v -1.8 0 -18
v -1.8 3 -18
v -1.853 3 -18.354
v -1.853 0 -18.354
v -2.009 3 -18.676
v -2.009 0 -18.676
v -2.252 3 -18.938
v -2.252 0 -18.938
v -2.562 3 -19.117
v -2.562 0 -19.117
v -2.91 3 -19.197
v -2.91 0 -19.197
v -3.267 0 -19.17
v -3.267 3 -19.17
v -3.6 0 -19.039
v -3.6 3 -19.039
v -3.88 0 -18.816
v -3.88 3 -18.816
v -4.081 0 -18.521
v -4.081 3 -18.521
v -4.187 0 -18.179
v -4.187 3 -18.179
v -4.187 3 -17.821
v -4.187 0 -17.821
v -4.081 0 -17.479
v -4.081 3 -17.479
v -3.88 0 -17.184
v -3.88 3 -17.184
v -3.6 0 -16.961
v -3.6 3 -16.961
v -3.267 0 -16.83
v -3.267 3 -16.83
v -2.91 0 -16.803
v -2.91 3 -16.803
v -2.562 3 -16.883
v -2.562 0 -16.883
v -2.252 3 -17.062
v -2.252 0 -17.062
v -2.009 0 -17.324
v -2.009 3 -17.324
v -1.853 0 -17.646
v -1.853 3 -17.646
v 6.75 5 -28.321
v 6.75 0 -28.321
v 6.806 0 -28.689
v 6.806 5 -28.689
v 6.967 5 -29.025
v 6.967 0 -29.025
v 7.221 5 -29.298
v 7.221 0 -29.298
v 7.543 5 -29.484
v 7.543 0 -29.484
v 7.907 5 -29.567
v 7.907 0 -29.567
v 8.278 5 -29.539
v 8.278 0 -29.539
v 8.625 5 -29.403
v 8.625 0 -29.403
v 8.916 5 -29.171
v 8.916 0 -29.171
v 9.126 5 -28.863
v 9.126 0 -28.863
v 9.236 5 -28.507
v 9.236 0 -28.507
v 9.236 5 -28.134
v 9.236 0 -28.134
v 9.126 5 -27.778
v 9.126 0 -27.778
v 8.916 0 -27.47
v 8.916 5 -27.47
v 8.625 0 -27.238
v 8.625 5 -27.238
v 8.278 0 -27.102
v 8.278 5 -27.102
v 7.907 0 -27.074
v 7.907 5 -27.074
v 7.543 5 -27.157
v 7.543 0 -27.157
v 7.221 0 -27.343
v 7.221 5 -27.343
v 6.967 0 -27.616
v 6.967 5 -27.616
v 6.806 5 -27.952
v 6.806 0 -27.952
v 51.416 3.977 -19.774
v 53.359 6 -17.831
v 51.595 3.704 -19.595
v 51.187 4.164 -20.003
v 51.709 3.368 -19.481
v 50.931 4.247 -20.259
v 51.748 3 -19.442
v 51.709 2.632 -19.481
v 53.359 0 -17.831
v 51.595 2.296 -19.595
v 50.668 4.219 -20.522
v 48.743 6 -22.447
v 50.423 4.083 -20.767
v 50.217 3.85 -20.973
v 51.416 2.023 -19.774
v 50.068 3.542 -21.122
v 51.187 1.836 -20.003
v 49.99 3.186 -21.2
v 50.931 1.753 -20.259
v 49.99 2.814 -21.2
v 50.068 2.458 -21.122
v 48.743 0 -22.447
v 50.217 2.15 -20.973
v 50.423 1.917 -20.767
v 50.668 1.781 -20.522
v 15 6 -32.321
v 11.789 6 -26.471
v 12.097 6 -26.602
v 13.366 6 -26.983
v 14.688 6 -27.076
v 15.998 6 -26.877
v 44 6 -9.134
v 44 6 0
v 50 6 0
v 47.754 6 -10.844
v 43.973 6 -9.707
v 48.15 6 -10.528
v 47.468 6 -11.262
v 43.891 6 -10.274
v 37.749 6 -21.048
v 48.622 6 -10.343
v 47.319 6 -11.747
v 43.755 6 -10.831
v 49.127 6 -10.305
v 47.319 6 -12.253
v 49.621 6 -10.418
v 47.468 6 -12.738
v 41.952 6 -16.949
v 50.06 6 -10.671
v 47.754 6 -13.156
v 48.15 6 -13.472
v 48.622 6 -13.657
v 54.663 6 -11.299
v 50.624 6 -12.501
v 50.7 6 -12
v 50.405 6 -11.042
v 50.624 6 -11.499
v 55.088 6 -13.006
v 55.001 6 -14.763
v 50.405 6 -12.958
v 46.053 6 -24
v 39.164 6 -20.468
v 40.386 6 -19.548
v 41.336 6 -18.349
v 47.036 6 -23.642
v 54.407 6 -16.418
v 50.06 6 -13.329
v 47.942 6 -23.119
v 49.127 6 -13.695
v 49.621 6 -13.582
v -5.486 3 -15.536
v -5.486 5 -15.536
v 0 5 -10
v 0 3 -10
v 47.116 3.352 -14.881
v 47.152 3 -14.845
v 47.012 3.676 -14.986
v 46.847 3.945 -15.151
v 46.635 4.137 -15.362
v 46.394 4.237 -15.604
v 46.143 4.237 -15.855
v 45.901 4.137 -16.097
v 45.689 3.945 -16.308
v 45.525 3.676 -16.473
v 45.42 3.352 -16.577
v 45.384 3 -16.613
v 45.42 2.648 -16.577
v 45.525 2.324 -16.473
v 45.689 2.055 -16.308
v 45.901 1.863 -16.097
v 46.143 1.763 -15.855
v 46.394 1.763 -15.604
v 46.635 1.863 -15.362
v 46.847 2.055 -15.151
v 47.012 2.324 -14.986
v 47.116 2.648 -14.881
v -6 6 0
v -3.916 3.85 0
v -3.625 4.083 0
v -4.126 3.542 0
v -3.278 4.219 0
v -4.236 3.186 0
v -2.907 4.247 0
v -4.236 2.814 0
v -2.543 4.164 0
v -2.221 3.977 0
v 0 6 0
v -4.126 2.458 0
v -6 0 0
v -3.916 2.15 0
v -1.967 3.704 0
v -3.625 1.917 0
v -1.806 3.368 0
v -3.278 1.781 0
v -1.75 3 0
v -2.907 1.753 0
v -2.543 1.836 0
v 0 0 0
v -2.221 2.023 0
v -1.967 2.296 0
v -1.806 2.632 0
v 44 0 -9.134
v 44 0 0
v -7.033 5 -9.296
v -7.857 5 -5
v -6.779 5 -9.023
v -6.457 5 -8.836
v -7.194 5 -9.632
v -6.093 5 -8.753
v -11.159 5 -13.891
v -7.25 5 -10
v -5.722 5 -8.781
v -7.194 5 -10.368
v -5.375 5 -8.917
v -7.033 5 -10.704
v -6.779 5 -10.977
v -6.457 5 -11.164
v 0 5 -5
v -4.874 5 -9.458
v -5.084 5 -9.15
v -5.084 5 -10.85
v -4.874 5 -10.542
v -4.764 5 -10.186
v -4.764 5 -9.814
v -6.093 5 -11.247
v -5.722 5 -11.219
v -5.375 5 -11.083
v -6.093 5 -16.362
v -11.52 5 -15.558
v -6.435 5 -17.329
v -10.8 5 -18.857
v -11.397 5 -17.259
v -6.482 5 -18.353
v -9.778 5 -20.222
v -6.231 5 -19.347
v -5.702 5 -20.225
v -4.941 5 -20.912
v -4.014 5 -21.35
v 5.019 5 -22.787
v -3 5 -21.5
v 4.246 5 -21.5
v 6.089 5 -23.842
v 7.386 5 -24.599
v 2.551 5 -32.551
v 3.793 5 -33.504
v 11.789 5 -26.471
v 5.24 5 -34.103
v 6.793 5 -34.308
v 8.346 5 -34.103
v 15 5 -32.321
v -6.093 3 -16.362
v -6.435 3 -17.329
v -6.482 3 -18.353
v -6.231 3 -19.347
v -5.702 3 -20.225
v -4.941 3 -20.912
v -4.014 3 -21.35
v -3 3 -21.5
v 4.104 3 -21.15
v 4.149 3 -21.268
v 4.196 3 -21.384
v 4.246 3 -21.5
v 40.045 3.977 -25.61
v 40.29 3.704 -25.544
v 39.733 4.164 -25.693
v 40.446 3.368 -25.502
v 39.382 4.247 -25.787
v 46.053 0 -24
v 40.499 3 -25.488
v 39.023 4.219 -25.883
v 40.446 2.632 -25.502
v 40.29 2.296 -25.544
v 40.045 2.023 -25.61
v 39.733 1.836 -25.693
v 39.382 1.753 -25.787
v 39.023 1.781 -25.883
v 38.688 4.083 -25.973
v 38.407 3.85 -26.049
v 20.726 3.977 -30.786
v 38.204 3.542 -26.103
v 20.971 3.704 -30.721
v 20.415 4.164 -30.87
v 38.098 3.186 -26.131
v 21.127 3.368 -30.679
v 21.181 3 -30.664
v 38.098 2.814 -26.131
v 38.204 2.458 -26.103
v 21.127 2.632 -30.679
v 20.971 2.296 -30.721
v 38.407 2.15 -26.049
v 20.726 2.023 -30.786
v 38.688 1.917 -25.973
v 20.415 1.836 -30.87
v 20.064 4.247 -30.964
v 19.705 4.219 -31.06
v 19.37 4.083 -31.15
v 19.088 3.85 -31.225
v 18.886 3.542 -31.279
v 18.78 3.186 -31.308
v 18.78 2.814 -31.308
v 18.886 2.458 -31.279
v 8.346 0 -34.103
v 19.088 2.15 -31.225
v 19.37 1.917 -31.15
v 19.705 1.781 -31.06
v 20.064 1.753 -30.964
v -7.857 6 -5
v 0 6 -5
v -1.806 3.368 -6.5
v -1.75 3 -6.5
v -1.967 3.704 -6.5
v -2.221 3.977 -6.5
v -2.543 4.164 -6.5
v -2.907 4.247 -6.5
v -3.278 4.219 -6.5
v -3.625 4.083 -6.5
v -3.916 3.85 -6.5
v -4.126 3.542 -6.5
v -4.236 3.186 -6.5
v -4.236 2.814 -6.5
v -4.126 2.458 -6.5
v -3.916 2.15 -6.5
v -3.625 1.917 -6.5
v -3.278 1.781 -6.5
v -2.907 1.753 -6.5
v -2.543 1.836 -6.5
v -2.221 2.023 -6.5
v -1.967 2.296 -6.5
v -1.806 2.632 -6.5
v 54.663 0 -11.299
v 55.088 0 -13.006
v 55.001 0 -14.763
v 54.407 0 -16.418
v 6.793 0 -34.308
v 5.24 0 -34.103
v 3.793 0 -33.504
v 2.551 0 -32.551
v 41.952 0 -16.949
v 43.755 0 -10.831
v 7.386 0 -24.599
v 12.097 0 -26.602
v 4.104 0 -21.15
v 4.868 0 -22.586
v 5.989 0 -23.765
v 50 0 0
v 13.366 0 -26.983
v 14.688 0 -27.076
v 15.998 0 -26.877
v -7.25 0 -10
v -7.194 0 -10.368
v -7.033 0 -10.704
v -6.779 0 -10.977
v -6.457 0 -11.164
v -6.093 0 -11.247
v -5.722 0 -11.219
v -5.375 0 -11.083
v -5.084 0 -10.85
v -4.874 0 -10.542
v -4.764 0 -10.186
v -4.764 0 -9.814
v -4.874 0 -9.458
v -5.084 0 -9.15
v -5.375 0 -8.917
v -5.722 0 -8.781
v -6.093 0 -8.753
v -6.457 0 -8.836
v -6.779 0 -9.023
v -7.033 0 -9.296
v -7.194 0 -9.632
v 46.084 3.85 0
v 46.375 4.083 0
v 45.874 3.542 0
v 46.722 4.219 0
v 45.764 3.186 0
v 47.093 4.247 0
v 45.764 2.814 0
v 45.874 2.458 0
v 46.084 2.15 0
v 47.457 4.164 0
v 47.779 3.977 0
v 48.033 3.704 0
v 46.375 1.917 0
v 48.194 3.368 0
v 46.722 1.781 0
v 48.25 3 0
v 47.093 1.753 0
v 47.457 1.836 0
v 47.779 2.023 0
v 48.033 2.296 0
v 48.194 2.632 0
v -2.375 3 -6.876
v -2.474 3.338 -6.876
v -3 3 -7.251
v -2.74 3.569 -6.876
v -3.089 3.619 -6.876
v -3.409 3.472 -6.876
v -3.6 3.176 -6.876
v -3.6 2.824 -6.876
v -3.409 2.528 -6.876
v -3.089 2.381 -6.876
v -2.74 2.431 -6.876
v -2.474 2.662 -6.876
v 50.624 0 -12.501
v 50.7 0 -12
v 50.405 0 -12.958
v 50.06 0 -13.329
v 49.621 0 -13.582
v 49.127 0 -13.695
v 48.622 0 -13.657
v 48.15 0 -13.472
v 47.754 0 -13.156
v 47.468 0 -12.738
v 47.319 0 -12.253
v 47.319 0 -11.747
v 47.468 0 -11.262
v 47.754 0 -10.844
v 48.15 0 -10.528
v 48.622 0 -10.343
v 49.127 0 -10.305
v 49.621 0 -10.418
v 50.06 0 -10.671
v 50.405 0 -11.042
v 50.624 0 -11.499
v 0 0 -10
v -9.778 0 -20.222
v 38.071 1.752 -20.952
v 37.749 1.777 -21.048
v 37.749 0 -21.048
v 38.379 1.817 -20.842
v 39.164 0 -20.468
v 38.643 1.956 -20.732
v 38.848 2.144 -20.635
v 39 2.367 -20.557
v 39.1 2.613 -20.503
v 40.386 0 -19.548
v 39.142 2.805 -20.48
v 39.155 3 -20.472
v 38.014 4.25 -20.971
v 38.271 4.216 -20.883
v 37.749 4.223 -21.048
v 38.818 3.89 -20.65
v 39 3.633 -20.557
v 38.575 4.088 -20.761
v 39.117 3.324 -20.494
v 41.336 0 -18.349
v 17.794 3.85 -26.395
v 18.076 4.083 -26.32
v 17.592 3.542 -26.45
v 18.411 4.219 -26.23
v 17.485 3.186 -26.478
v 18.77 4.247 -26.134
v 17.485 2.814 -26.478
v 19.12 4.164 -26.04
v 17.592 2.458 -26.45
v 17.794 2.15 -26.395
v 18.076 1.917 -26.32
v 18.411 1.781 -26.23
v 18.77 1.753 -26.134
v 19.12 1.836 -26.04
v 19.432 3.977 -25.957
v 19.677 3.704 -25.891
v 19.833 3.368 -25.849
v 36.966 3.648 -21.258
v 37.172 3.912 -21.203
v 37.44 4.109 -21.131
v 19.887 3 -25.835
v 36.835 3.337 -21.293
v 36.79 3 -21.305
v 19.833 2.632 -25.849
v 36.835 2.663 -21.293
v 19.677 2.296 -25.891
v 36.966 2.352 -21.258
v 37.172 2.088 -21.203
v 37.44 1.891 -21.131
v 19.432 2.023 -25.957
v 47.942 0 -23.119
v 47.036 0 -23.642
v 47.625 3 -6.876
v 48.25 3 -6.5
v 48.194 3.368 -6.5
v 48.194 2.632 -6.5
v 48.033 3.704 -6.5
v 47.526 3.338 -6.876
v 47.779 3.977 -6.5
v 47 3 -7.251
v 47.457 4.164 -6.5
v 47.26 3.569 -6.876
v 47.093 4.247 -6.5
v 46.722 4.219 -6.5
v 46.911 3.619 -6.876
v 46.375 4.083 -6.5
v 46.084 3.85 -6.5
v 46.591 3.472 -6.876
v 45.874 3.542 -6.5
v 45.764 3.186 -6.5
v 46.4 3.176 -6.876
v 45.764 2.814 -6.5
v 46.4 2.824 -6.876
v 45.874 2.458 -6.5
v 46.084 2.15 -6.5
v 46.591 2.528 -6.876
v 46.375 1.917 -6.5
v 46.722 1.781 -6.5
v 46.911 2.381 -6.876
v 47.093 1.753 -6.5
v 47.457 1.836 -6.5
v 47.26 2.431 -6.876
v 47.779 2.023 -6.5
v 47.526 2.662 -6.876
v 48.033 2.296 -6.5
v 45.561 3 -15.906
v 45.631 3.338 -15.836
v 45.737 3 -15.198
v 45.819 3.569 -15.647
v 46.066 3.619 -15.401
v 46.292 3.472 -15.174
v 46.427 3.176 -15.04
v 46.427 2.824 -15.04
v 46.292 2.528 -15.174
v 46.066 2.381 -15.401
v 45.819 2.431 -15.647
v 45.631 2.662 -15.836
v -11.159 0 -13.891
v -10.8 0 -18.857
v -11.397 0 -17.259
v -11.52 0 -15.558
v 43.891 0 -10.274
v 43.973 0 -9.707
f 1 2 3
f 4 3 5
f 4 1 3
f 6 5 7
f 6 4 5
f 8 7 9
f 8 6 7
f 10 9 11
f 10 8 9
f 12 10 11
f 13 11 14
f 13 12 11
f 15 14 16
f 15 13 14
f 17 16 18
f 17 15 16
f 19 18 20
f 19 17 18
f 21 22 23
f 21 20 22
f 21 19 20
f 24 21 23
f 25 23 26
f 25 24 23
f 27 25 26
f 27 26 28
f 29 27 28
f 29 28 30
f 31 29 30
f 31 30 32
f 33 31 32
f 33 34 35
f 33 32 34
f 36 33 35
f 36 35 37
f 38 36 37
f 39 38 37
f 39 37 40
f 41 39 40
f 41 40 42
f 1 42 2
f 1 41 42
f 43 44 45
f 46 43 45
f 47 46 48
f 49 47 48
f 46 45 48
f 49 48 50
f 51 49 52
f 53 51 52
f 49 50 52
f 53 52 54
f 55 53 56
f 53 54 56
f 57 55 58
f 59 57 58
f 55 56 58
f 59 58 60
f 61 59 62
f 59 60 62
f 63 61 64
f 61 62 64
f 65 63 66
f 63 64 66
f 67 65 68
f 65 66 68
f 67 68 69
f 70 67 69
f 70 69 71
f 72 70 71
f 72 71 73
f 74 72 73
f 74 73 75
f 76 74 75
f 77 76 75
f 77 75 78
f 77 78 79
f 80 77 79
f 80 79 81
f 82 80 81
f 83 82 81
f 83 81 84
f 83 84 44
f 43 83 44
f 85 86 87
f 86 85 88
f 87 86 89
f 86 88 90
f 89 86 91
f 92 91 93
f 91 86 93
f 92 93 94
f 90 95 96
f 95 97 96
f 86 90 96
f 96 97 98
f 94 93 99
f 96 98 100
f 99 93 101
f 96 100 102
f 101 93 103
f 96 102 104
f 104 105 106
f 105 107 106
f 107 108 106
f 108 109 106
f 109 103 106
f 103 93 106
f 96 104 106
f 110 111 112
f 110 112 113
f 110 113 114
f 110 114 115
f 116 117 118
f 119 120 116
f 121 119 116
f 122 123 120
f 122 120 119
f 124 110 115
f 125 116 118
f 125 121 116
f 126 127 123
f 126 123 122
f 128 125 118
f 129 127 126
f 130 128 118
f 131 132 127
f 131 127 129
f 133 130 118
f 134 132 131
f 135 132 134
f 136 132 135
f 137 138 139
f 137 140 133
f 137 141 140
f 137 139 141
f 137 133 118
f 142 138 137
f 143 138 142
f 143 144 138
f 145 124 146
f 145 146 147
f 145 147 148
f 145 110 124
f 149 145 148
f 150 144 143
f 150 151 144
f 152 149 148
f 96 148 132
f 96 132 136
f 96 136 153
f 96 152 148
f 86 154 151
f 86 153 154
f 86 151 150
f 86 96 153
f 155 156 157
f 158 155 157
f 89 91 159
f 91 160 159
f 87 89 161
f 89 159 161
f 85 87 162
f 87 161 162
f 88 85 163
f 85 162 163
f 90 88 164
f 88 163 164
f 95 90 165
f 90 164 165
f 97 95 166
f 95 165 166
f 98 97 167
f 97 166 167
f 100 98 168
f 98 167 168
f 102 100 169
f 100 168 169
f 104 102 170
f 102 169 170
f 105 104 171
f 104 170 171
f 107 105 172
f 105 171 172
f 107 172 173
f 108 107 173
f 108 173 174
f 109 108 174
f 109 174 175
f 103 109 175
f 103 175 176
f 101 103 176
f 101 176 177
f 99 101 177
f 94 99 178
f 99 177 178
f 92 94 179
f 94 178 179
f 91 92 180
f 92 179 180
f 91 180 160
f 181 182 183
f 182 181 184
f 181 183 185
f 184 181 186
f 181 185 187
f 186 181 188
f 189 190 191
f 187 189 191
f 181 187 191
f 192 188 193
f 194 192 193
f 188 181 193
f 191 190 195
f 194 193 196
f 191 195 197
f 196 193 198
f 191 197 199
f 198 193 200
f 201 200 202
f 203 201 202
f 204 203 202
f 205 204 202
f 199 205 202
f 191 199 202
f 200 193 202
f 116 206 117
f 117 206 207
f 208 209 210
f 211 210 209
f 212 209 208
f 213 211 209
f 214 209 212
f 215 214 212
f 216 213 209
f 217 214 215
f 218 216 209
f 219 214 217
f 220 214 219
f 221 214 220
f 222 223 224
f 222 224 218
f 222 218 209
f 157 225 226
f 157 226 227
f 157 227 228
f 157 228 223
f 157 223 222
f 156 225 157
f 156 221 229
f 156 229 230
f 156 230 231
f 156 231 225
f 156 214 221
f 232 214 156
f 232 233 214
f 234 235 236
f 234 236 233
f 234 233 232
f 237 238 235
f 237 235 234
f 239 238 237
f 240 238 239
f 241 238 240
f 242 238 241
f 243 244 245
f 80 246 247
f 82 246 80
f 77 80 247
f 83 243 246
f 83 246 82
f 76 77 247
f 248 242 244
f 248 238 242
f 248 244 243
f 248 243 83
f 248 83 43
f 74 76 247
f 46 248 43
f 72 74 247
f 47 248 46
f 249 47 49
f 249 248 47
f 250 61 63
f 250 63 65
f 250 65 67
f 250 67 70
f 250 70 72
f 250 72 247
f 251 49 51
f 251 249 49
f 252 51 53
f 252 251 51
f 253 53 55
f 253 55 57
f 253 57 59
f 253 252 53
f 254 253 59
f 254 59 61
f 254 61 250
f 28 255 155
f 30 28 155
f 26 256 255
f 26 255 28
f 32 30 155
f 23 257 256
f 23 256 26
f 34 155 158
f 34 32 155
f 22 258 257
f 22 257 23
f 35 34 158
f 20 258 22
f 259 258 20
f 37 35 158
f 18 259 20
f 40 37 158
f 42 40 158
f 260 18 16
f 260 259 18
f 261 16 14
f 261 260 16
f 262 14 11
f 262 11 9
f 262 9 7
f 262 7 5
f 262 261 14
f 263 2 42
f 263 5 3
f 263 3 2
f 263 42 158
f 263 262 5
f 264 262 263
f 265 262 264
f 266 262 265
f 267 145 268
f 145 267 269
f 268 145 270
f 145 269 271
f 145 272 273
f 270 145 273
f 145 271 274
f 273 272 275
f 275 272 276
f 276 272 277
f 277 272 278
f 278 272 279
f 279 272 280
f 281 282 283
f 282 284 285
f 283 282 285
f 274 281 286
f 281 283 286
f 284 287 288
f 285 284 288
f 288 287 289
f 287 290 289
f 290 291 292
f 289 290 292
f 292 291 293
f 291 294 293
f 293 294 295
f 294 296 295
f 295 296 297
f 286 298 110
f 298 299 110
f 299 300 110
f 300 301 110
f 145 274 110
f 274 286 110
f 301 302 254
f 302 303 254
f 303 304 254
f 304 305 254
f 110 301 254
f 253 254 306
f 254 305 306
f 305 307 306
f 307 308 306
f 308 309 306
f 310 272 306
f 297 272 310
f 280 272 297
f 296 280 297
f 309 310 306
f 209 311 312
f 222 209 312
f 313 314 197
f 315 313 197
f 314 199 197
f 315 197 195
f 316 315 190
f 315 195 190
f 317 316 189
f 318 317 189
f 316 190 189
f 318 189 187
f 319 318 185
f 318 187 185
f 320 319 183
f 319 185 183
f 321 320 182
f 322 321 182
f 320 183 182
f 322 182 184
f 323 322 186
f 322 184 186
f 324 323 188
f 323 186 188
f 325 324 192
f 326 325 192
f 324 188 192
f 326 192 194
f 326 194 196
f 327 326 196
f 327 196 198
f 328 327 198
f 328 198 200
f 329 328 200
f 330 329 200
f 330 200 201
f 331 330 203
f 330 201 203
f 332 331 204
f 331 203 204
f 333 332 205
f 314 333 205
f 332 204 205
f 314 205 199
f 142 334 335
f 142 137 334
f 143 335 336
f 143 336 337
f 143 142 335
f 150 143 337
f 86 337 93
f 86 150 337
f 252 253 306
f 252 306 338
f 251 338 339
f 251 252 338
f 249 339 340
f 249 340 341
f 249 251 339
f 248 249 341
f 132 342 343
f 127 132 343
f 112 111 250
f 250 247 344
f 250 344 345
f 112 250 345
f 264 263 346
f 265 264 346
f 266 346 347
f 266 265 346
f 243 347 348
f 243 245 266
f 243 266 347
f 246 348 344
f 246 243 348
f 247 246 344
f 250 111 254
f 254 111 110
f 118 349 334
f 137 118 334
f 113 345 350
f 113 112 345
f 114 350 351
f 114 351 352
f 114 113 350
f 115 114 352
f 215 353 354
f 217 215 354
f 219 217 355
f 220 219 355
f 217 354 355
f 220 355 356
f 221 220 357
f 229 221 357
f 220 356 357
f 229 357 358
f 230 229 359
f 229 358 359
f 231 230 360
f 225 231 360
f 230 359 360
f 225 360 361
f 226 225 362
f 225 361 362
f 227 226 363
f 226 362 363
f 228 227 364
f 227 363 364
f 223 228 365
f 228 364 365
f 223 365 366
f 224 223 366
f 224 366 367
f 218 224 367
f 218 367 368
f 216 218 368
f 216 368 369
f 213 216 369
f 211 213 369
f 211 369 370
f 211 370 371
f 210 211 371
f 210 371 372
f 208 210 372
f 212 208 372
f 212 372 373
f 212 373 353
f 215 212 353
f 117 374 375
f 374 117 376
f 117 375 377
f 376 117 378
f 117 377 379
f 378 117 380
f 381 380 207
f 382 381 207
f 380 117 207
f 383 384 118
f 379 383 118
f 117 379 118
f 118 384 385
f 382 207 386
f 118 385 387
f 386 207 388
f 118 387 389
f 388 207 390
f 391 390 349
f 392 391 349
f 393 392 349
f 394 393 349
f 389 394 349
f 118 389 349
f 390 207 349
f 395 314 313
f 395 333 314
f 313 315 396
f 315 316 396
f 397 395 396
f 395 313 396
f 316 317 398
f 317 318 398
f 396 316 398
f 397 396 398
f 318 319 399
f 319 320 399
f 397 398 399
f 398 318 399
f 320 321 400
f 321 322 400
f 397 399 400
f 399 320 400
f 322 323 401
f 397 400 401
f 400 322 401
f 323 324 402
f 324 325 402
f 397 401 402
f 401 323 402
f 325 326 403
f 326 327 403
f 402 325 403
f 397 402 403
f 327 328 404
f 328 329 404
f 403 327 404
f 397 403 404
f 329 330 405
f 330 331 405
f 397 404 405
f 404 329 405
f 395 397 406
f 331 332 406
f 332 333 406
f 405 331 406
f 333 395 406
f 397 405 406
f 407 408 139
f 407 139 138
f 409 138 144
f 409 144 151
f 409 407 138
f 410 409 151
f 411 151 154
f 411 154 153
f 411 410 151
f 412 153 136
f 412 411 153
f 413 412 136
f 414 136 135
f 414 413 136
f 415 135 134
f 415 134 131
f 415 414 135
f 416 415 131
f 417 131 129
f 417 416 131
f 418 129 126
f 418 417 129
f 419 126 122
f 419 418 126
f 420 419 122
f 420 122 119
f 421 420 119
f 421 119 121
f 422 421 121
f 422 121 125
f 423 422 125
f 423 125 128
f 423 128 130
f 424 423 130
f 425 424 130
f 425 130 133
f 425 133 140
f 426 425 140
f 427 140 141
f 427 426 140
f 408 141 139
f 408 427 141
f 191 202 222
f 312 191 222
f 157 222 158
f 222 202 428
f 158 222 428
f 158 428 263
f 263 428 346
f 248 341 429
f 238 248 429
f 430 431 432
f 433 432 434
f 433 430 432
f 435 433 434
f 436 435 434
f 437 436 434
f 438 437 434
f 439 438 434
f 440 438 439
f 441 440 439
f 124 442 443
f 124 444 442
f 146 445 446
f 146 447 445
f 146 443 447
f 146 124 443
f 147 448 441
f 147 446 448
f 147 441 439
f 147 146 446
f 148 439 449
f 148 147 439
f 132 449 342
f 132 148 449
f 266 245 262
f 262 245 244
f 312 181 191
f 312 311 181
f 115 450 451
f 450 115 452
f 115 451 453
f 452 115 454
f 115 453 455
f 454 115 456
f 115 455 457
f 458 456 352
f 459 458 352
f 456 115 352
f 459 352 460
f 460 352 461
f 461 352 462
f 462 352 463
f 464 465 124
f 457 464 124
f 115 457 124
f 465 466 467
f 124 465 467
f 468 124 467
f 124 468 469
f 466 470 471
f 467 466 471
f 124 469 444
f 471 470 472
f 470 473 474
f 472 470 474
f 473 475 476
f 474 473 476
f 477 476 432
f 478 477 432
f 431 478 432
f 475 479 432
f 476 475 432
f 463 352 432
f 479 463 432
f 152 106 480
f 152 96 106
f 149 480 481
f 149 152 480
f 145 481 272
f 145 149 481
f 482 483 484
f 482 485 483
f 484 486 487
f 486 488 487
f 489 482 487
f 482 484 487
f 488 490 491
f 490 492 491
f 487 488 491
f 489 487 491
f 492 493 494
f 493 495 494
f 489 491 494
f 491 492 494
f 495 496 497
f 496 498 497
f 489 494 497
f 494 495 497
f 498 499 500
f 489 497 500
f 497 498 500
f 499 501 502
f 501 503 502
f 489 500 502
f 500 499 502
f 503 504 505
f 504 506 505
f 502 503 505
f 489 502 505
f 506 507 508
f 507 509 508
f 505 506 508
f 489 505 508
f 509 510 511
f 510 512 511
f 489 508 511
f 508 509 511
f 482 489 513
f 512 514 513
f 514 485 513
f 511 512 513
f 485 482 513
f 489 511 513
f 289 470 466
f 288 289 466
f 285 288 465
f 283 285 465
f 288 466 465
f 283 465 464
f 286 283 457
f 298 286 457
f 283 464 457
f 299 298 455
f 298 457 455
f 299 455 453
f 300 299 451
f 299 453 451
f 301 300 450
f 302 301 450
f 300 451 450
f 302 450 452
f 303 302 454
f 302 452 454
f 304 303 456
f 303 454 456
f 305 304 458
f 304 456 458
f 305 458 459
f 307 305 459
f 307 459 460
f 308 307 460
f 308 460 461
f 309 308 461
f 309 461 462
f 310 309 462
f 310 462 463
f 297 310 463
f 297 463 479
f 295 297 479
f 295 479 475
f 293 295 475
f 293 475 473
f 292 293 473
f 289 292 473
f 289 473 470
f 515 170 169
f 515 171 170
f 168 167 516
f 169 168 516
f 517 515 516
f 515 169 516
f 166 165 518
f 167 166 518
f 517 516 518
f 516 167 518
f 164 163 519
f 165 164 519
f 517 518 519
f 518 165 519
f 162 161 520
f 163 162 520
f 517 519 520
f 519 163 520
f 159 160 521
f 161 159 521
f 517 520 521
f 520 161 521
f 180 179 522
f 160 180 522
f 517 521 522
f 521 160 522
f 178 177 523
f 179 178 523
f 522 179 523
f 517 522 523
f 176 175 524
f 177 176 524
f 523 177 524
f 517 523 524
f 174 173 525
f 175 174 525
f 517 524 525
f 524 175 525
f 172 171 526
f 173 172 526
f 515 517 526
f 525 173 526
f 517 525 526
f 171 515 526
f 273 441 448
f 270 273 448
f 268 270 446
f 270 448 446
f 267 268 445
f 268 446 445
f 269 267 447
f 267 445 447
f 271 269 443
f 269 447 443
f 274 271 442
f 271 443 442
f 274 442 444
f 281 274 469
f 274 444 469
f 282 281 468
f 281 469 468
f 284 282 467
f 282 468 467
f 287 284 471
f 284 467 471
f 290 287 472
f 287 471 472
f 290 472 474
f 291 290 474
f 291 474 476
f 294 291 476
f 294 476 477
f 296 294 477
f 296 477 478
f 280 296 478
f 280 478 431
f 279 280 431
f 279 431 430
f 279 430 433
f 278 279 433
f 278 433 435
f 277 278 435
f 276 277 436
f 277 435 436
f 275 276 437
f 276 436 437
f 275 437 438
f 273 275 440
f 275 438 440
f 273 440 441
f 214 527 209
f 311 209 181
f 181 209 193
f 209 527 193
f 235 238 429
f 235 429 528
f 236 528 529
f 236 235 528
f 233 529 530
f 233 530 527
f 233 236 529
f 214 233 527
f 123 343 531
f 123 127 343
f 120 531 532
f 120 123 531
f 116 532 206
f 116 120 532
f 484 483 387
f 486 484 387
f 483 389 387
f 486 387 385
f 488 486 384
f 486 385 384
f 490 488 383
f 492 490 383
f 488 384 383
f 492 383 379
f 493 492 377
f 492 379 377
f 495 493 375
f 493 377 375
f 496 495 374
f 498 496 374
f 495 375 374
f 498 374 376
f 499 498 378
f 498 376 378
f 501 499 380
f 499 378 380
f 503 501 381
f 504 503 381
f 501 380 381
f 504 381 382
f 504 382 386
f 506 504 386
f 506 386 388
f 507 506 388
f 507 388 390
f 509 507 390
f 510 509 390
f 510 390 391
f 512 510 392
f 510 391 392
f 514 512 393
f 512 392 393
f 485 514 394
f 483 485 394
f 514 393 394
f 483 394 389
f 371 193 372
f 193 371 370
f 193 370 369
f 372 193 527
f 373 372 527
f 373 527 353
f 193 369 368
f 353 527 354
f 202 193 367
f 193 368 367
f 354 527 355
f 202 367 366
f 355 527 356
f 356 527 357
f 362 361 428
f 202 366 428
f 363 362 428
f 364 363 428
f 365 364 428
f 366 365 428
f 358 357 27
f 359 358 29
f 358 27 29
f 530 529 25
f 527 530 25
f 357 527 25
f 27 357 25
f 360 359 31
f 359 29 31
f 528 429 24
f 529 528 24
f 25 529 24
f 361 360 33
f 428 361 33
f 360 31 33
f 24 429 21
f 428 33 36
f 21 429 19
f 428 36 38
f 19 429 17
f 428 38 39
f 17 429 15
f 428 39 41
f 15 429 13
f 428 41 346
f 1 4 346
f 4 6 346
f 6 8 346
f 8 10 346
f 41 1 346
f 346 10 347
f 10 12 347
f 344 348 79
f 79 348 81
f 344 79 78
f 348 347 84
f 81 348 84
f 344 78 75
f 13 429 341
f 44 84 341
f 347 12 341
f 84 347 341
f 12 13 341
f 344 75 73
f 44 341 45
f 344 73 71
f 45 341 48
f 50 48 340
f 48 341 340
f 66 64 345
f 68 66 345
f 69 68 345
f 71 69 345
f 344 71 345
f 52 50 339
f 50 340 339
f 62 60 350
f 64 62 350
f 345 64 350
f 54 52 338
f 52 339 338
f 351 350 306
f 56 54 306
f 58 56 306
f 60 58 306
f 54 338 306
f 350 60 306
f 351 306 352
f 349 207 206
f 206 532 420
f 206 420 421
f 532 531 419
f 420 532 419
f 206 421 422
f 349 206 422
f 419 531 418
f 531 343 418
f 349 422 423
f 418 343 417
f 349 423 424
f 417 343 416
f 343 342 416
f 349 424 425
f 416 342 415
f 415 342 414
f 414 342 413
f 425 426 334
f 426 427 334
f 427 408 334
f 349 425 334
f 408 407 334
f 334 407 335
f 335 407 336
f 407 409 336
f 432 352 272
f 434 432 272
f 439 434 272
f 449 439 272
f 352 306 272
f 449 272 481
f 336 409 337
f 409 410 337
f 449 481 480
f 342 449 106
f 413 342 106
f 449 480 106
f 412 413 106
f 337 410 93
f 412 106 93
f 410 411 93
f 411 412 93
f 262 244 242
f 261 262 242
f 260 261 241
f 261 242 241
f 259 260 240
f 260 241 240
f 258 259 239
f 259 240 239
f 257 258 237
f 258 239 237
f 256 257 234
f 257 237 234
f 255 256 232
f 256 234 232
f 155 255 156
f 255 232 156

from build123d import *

# Parameters (mm, degrees)
AUFSATZ_LINEAR_AUSTRAGEN1_DEPTH  = 6
VERRUNDUNG1_R                    = 6
DURCHGANGSLOCH_F_R_M21_OUTLINE_R = 1.2
DURCHGANGSLOCH_F_R_M21_DEPTH     = 6
SCHNITT_LINEAR_AUSTRAGEN1_DEPTH  = 3
SCHNITT_LINEAR_AUSTRAGEN2_DEPTH  = 1
M3_GEWINDEBOHRUNG2_D             = 2.5
M3_GEWINDEBOHRUNG3_D             = 2.5
M3_GEWINDEBOHRUNG3_DEPTH         = 6.5
M3_GEWINDEBOHRUNG3_TIP           = 0.751075774
M3_GEWINDEBOHRUNG4_D             = 2.5
M3_GEWINDEBOHRUNG4_DEPTH         = 6.5
M3_GEWINDEBOHRUNG4_TIP           = 0.751075774
DURCHGANGSLOCH_F_R_M32_OUTLINE_R = 1.7
DURCHGANGSLOCH_F_R_M32_DEPTH     = 6


# Read off the part's stored shape, not the designer's step: Durchgangsloch für M21, M3 Gewindebohrung1, Durchgangsloch für M32
with BuildPart() as part:
    # Skizze1 → Aufsatz-Linear austragen1 (new body)
    with BuildSketch(Plane(origin=(0, 0, 0), x_dir=(1, 0, 0), z_dir=(0, 1, 0))):
        Polygon((-6, 0), (0, 0), (0, 10), (5, 23.583657959), (14, 27.412076366), (41, 20.17744817), (44, 10), (44, 0), (50, 0), (56.190026492, 15), (47.606368533, 23.583657959), (5, 35), (-12.5, 17.5), align=None)
    extrude(amount=AUFSATZ_LINEAR_AUSTRAGEN1_DEPTH)

    # Verrundung1
    verrundung1_edges = [part.edges().sort_by_distance(p)[0] for p in [
        (-12.5, 3, -17.5),
        (5, 3, -35),
        (47.606368533, 3, -23.583657959),
        (56.190026492, 3, -15),
        (44, 3, -10),
        (41, 3, -20.17744817),
        (14, 3, -27.412076366),
        (5, 3, -23.583657959),
    ]]
    fillet(verrundung1_edges, radius=VERRUNDUNG1_R)

    # Durchgangsloch für M21 outline → Durchgangsloch für M21 (cut)
    with BuildSketch(Plane(origin=(0, 0, 0), x_dir=(1, 0, 0), z_dir=(0, 1, 0))):
        with Locations((-3, 18)):
            Circle(DURCHGANGSLOCH_F_R_M21_OUTLINE_R)
    extrude(amount=DURCHGANGSLOCH_F_R_M21_DEPTH, mode=Mode.SUBTRACT)

    # M3 Gewindebohrung1 outline → M3 Gewindebohrung1 (revolve, cut)
    with BuildSketch(Plane(origin=(47, 3, 0), x_dir=(1, 0, 0), z_dir=(0, -1, 0))):
        Polygon((0, 0), (0, -7.251075774), (1.25, -6.5), (1.25, 0), align=None)
    revolve(axis=Axis((47, 3, 0), (0, 0, 1)), mode=Mode.SUBTRACT)

    # M3 Gewindebohrung1 2 outline → M3 Gewindebohrung1 2 (revolve, cut)
    with BuildSketch(Plane(origin=(-3, 3, 0), x_dir=(1, 0, 0), z_dir=(0, -1, 0))):
        Polygon((0, 0), (0, -7.251075774), (1.25, -6.5), (1.25, 0), align=None)
    revolve(axis=Axis((-3, 3, 0), (0, 0, 1)), mode=Mode.SUBTRACT)

    # Skizze8 → Schnitt-Linear austragen1 (cut)
    with BuildSketch(Plane(origin=(0, 6, 0), x_dir=(1, 0, 0), z_dir=(0, 1, 0))):
        with BuildLine():
            Line((-5.48614249, 15.536446566), (0, 10))
            Line((0, 10), (4.293633921, 21.5))
            Line((4.293633921, 21.5), (-3, 21.5))
            ThreePointArc((-3, 21.5), (-6.23051366, 19.346767052), (-5.48614249, 15.536446566))
        make_face()
    extrude(amount=-SCHNITT_LINEAR_AUSTRAGEN1_DEPTH, mode=Mode.SUBTRACT)

    # Skizze9 → Schnitt-Linear austragen2 (cut)
    with BuildSketch(Plane(origin=(0, 6, 0), x_dir=(1, 0, 0), z_dir=(0, 1, 0))):
        Polygon((-7.857142857, 5), (0, 5), (15, 32.320508076), (5, 35), (-12.5, 17.5), align=None)
    extrude(amount=-SCHNITT_LINEAR_AUSTRAGEN2_DEPTH, mode=Mode.SUBTRACT)

    # M3 Gewindebohrung2 (through all)
    with Locations(Plane(origin=(0, 5, 0), x_dir=(1, 0, 0), z_dir=(0, 1, 0))):
        with Locations((8, 28.320508076), (-6, 10)):
            Hole(M3_GEWINDEBOHRUNG2_D / 2)

    # M3 Gewindebohrung3
    with Locations(Plane(origin=(9.084936491, 0, -33.905444566), x_dir=(-0.9659258262890604, 0, -0.2588190451025504), z_dir=(0.2588190451025504, 0, -0.9659258262890604))):
        with Locations((-31.272625875, 3), (-11.272625875, 3)):
            Hole(M3_GEWINDEBOHRUNG3_D / 2, depth=M3_GEWINDEBOHRUNG3_DEPTH)
            with Locations((0, 0, -(M3_GEWINDEBOHRUNG3_DEPTH + M3_GEWINDEBOHRUNG3_TIP / 2))):  # 118° drill point
                Cone(0, M3_GEWINDEBOHRUNG3_D / 2, M3_GEWINDEBOHRUNG3_TIP, mode=Mode.SUBTRACT)

    # M3 Gewindebohrung4
    with Locations(Plane(origin=(35.595013246, 0, -35.595013246), x_dir=(-0.7071067811865515, 0, -0.7071067811865436), z_dir=(0.7071067811865436, 0, -0.7071067811865515))):
        with Locations((-21.594316704, 3)):
            Hole(M3_GEWINDEBOHRUNG4_D / 2, depth=M3_GEWINDEBOHRUNG4_DEPTH)
            with Locations((0, 0, -(M3_GEWINDEBOHRUNG4_DEPTH + M3_GEWINDEBOHRUNG4_TIP / 2))):  # 118° drill point
                Cone(0, M3_GEWINDEBOHRUNG4_D / 2, M3_GEWINDEBOHRUNG4_TIP, mode=Mode.SUBTRACT)

    # Durchgangsloch für M32 outline → Durchgangsloch für M32 (cut)
    with BuildSketch(Plane(origin=(0, 0, 0), x_dir=(1, 0, 0), z_dir=(0, 1, 0))):
        with Locations((49, 12)):
            Circle(DURCHGANGSLOCH_F_R_M32_OUTLINE_R)
    extrude(amount=DURCHGANGSLOCH_F_R_M32_DEPTH, mode=Mode.SUBTRACT)


solid = part.part
